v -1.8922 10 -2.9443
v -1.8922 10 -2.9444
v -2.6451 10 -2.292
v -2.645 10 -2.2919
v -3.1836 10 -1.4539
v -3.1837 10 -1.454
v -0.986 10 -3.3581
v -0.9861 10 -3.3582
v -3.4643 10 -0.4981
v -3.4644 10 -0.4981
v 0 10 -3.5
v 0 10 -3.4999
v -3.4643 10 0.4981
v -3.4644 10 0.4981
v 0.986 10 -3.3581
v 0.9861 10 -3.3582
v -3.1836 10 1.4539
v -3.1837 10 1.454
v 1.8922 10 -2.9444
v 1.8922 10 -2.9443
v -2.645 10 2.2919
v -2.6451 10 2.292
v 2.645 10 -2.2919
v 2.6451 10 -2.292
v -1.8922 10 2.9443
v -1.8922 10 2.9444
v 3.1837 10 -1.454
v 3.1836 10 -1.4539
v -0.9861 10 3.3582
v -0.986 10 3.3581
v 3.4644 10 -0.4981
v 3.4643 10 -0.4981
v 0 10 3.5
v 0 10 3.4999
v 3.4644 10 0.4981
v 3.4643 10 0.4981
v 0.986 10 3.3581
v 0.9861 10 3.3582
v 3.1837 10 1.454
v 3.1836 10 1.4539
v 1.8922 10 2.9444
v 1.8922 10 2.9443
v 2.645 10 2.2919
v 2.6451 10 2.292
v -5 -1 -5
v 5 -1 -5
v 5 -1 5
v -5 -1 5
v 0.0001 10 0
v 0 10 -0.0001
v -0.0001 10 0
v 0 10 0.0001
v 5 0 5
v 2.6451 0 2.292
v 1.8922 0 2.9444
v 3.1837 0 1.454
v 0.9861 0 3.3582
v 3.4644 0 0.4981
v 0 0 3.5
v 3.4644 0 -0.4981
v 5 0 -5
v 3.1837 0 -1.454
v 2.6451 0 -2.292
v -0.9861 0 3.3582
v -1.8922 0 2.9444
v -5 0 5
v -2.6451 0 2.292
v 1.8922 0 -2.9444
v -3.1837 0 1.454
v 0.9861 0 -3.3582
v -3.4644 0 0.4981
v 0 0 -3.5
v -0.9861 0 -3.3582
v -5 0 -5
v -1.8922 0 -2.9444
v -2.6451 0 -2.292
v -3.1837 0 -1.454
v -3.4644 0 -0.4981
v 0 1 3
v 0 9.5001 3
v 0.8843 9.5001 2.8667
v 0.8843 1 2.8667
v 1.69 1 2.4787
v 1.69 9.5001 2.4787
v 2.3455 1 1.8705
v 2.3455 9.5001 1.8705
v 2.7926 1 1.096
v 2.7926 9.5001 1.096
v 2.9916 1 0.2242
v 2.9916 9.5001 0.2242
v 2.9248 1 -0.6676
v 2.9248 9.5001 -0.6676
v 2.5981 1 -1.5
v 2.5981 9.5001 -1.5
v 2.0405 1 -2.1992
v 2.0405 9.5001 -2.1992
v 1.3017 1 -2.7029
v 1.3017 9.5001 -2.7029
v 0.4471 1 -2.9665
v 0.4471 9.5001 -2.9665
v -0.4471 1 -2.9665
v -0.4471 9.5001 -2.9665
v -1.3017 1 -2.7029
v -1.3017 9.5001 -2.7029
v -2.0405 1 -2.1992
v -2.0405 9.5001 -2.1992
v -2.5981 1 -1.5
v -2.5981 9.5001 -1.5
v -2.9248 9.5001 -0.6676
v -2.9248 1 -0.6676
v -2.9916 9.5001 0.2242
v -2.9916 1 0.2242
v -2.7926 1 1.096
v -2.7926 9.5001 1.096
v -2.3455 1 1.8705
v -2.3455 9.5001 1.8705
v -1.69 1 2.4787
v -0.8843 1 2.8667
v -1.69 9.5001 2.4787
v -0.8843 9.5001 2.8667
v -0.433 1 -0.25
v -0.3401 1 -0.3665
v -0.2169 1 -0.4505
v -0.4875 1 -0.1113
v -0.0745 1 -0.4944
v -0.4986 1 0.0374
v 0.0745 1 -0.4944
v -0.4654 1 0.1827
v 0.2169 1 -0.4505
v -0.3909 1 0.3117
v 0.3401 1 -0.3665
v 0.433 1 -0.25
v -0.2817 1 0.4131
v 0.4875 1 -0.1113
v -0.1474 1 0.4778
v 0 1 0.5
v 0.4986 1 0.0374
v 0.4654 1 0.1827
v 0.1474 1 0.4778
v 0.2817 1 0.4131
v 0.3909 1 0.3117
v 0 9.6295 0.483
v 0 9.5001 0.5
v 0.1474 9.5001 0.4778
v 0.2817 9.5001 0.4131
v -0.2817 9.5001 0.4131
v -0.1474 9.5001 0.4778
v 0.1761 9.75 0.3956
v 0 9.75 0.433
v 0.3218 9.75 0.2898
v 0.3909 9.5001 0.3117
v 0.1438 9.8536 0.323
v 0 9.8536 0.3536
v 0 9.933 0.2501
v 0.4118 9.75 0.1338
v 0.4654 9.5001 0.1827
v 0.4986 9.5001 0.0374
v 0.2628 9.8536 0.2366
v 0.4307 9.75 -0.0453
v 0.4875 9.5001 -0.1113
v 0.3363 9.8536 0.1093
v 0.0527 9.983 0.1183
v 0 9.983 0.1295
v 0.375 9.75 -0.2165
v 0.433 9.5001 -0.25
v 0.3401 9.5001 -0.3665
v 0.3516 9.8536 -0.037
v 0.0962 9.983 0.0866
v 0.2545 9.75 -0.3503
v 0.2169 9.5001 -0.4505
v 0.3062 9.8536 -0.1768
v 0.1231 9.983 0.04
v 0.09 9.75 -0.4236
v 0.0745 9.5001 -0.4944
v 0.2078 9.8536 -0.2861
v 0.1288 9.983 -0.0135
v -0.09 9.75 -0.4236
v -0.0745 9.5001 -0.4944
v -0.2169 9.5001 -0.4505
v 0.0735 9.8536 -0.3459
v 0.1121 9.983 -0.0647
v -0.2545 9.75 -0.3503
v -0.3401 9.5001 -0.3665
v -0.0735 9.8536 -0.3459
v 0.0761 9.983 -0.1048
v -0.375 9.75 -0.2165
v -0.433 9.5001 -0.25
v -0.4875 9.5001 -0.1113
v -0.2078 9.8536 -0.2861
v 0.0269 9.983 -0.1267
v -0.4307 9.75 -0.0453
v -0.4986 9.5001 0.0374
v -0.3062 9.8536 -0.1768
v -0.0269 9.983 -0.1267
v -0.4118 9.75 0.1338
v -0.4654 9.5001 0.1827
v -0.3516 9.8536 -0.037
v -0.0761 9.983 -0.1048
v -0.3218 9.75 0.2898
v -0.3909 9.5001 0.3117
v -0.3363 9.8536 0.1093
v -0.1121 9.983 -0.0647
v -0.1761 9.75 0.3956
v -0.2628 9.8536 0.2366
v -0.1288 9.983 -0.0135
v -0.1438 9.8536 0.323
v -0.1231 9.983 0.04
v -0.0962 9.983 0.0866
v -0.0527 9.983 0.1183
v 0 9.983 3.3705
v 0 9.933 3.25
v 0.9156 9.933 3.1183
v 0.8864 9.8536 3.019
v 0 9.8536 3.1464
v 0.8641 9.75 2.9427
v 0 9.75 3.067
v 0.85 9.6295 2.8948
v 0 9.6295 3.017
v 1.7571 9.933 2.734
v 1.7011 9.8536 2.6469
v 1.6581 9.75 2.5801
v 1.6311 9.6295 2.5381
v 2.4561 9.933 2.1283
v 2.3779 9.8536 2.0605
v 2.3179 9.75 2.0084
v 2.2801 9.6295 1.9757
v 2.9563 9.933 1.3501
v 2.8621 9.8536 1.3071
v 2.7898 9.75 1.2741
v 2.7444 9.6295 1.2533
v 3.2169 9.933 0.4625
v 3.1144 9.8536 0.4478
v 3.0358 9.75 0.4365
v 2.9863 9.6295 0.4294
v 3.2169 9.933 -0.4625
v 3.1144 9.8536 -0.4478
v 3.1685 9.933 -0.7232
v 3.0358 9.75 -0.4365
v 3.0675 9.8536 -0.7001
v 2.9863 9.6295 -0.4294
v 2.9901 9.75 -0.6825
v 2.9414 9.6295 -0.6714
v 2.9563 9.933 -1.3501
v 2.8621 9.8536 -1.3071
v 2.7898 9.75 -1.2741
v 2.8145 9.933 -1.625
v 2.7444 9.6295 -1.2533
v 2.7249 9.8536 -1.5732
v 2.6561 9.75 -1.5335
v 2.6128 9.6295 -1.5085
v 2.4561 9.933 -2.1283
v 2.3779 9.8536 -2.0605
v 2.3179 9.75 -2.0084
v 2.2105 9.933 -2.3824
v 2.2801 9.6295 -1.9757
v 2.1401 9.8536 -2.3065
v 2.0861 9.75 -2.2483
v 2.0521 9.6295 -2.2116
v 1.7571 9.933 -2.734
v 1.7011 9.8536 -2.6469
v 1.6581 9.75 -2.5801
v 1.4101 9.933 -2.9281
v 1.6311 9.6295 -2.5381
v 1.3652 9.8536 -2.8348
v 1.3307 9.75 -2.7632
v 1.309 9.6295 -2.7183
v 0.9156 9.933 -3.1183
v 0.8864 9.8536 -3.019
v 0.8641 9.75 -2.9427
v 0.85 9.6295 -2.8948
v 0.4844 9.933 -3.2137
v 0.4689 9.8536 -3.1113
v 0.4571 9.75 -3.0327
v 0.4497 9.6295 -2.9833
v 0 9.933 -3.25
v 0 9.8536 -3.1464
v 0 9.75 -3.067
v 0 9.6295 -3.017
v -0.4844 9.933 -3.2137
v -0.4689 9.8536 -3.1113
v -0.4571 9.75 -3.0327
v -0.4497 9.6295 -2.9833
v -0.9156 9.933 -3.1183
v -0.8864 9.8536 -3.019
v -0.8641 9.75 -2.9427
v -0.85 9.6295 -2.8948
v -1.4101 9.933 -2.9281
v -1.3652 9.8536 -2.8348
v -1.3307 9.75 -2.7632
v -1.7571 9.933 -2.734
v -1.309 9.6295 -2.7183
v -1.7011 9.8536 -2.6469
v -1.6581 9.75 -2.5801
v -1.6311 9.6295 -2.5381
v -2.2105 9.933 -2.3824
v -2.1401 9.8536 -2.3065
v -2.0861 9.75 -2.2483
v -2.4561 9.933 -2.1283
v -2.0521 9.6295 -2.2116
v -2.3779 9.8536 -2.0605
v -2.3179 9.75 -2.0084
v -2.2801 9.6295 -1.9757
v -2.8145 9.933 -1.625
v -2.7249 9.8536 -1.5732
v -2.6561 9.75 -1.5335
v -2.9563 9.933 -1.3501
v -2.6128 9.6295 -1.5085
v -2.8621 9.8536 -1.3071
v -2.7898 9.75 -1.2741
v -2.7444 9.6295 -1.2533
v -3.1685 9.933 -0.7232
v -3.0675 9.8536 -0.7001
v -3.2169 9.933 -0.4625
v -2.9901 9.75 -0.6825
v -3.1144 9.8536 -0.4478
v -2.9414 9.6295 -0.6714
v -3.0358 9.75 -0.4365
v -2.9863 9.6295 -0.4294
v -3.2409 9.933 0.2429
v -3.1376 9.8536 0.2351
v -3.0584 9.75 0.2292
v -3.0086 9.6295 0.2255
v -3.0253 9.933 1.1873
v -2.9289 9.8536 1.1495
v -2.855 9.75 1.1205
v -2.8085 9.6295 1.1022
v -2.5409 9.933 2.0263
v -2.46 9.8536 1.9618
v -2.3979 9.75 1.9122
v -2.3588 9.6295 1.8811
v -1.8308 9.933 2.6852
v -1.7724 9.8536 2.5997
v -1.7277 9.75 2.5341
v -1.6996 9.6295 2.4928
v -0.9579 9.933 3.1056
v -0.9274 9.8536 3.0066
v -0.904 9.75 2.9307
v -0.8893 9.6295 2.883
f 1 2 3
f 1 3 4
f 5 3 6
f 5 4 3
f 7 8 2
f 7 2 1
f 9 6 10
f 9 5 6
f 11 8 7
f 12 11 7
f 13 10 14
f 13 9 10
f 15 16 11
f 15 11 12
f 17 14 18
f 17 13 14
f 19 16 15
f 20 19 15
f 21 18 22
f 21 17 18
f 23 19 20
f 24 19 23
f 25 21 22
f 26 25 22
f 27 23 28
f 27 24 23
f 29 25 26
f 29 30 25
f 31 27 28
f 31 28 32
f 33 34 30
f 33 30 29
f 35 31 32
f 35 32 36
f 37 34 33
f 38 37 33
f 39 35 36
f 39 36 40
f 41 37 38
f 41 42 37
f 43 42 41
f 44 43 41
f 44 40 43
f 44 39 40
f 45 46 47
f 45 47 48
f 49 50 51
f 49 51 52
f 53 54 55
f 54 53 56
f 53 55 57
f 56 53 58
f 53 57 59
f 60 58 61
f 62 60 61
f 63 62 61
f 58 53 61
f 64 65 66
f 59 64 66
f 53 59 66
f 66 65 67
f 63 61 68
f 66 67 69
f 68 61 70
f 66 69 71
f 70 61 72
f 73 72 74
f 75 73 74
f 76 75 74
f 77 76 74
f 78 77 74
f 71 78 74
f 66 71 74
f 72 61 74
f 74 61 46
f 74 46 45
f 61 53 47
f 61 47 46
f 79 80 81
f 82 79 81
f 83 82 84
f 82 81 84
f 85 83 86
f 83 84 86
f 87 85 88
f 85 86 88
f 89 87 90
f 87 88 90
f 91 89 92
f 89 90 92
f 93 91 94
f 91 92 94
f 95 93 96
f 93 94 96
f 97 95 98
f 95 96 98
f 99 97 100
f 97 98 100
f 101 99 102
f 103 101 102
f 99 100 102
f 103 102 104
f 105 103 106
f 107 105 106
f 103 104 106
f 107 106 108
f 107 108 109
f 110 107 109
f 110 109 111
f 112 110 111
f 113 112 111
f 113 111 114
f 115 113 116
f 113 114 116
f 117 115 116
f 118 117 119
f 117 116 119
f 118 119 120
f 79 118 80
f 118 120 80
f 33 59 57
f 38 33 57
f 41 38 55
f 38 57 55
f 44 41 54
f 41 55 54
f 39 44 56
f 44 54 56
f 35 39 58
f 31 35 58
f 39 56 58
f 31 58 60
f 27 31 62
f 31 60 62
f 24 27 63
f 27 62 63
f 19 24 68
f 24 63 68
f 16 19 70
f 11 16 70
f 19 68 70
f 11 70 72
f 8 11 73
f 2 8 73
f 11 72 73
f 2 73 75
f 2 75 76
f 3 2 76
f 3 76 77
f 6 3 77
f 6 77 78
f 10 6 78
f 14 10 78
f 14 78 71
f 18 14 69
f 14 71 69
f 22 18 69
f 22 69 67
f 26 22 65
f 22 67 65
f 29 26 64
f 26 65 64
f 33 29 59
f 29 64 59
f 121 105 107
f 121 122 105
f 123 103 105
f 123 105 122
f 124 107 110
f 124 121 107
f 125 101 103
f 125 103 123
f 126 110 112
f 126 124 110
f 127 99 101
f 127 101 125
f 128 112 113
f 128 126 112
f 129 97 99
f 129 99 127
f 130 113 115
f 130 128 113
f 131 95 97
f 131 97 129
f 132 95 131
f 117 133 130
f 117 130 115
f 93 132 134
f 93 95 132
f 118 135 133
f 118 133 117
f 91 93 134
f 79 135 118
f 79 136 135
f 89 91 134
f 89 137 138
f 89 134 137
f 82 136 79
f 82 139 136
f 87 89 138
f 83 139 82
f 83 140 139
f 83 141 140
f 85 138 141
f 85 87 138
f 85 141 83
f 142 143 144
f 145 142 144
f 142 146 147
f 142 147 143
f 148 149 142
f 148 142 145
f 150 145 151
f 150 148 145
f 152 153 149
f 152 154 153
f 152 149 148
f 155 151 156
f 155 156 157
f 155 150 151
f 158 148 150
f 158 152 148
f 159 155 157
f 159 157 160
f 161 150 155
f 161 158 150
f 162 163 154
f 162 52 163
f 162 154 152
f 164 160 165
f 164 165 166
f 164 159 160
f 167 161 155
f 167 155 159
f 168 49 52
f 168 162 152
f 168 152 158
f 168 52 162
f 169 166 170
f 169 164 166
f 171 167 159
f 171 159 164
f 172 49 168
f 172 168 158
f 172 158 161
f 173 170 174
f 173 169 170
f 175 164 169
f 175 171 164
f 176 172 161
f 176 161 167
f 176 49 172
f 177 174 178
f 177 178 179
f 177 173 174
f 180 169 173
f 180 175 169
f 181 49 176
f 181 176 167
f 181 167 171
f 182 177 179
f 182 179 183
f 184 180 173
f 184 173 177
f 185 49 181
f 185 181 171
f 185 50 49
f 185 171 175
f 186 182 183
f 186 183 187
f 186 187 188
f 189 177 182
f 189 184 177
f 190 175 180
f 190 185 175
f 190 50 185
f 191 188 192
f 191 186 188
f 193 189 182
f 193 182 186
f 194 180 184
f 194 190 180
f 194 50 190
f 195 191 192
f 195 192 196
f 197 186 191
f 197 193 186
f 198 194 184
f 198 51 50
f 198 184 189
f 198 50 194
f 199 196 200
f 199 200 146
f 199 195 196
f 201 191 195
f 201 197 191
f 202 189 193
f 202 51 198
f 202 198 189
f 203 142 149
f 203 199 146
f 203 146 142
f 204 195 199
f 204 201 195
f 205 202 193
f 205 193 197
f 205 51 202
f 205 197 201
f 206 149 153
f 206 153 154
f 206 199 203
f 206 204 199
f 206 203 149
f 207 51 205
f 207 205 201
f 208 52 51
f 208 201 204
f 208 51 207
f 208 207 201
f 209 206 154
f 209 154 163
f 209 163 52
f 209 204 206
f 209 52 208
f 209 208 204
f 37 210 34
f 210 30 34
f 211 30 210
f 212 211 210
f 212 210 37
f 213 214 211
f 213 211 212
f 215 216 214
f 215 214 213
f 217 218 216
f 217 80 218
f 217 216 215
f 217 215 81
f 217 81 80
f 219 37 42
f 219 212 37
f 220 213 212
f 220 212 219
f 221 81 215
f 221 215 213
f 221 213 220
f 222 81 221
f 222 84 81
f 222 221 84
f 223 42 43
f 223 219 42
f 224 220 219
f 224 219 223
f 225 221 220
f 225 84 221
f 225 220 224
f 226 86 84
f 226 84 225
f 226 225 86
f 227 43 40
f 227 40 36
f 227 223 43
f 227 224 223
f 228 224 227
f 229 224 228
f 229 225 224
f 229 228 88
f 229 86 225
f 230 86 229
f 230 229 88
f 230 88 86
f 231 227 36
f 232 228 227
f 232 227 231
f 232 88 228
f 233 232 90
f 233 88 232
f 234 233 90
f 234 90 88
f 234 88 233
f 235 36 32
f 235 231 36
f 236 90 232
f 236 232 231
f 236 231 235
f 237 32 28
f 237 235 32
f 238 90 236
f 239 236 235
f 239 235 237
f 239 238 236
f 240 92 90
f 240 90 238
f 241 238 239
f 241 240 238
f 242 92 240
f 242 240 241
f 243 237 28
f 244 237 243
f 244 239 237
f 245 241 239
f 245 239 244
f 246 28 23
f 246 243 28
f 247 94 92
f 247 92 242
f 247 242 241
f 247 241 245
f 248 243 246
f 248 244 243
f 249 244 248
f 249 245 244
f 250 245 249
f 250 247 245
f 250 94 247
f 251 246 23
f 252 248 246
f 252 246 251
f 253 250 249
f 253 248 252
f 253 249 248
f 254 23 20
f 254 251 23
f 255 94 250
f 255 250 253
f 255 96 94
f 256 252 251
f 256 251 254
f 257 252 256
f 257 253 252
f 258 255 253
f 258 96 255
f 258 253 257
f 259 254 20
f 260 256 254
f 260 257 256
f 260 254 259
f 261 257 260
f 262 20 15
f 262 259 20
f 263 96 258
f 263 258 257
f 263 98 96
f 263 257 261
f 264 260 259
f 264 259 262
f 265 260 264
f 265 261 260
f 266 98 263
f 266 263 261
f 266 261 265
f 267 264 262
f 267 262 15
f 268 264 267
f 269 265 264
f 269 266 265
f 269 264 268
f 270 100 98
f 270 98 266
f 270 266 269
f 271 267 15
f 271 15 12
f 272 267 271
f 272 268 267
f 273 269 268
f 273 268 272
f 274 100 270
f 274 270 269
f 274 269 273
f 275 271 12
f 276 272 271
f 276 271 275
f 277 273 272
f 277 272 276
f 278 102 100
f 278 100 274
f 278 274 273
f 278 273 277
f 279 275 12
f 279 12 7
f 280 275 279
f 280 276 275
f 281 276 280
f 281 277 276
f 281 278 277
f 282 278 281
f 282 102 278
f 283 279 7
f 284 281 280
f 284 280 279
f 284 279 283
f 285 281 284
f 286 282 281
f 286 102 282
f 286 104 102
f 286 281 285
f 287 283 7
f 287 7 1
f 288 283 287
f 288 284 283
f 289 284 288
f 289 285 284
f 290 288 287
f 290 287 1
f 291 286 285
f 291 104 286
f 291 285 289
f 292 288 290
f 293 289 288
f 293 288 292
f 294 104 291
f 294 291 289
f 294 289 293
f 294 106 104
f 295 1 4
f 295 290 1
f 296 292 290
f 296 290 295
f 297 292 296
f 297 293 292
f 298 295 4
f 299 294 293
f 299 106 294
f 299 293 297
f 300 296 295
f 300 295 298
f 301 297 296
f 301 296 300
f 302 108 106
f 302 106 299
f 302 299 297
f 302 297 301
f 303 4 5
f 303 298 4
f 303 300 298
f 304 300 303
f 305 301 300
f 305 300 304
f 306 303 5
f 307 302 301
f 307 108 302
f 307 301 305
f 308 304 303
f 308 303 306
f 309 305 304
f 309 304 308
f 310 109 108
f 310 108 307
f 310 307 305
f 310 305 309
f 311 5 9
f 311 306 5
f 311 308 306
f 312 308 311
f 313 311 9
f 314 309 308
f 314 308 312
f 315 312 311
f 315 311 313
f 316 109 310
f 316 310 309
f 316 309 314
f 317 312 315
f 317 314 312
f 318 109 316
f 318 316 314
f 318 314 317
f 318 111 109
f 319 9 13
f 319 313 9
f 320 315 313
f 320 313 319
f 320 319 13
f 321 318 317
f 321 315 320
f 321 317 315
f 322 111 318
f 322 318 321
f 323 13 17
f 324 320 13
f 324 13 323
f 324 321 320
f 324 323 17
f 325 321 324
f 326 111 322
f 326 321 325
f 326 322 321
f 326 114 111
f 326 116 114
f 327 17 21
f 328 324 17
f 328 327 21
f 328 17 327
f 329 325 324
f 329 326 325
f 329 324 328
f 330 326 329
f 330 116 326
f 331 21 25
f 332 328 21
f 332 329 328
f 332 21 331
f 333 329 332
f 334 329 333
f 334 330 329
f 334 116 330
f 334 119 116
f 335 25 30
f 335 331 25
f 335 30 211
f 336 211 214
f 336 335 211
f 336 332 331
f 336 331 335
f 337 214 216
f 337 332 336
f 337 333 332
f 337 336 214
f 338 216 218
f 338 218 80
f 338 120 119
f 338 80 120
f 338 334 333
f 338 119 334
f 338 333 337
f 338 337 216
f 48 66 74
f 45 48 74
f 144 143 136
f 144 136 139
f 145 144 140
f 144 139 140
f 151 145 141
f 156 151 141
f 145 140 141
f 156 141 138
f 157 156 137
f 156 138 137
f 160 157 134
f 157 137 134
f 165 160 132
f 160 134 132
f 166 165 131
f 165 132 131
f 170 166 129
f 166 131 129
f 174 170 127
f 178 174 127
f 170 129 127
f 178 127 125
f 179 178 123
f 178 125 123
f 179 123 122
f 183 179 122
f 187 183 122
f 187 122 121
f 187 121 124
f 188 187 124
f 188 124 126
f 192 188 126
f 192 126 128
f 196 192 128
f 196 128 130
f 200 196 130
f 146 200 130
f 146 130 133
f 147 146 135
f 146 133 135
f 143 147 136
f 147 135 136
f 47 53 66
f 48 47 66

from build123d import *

# Parameters (mm, degrees)
SKETCH1_R           = 3.5
BOSS_EXTRUDE1_DEPTH = 10
SKETCH2_R           = 3
CUT_EXTRUDE1_DEPTH  = 9
SKETCH3_R           = 0.5
BOSS_EXTRUDE2_DEPTH = 9
FILLET1_R           = 0.5
SKETCH4_W           = 10
SKETCH4_H           = 10
BOSS_EXTRUDE3_DEPTH = 1


with BuildPart() as part:
    # Sketch1 → Boss-Extrude1 (new body)
    with BuildSketch(Plane(origin=(0, 0, 0), x_dir=(1, 0, 0), z_dir=(0, 1, 0))):
        with Locations(Location((0, 0, 0), (0, 0, 270))):
            Circle(SKETCH1_R)
    extrude(amount=BOSS_EXTRUDE1_DEPTH)

    # Sketch2 → Cut-Extrude1 (cut)
    with BuildSketch(Plane(origin=(0, 10, 0), x_dir=(1, 0, 0), z_dir=(0, 1, 0))):
        with Locations(Location((0, 0, 0), (0, 0, 270))):
            Circle(SKETCH2_R)
    extrude(amount=-CUT_EXTRUDE1_DEPTH, mode=Mode.SUBTRACT)

    # Sketch3 → Boss-Extrude2 (add)
    with BuildSketch(Plane(origin=(0, 1, 0), x_dir=(1, 0, 0), z_dir=(0, 1, 0))):
        with Locations(Location((0, 0, 0), (0, 0, 270))):
            Circle(SKETCH3_R)
    extrude(amount=BOSS_EXTRUDE2_DEPTH)

    # Fillet1
    fillet1_edges = [part.edges().sort_by_distance(p)[0] for p in [
        (0, 10, -0.5),
        (0, 10, -3),
    ]]
    fillet(fillet1_edges, radius=FILLET1_R - 0.0001)  # a hair under: the kernel refuses the full size

    # Sketch4 → Boss-Extrude3 (add)
    with BuildSketch(Plane(origin=(0, 0, 0), x_dir=(-1, 0, 0), z_dir=(0, -1, 0))):
        Rectangle(SKETCH4_W, SKETCH4_H)
    extrude(amount=BOSS_EXTRUDE3_DEPTH)


solid = part.part
